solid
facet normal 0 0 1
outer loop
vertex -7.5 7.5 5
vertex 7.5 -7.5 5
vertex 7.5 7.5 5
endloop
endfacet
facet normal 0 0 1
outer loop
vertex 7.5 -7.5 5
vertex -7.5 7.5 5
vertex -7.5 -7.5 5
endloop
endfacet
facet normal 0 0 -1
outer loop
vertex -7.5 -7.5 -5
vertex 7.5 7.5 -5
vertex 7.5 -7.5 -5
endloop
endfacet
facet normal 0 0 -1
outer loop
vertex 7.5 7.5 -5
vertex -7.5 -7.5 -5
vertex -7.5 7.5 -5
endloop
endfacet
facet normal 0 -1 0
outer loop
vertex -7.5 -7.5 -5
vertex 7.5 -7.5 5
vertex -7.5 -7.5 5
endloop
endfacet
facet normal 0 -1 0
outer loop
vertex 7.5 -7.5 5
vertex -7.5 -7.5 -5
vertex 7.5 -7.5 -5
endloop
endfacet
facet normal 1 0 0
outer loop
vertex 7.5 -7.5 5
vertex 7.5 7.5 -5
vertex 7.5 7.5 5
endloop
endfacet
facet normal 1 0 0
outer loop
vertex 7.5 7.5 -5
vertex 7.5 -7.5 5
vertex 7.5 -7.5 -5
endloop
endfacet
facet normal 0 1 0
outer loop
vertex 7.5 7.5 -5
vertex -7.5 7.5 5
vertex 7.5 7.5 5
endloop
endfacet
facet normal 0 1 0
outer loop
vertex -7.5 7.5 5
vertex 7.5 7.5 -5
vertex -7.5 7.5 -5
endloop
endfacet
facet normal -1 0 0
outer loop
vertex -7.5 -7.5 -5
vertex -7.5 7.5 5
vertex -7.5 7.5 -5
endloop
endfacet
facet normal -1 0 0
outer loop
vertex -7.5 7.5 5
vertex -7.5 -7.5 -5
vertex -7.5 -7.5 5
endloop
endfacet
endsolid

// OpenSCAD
// Generated by generate_scads.py
cube(size=[15,15,10], center=true);
